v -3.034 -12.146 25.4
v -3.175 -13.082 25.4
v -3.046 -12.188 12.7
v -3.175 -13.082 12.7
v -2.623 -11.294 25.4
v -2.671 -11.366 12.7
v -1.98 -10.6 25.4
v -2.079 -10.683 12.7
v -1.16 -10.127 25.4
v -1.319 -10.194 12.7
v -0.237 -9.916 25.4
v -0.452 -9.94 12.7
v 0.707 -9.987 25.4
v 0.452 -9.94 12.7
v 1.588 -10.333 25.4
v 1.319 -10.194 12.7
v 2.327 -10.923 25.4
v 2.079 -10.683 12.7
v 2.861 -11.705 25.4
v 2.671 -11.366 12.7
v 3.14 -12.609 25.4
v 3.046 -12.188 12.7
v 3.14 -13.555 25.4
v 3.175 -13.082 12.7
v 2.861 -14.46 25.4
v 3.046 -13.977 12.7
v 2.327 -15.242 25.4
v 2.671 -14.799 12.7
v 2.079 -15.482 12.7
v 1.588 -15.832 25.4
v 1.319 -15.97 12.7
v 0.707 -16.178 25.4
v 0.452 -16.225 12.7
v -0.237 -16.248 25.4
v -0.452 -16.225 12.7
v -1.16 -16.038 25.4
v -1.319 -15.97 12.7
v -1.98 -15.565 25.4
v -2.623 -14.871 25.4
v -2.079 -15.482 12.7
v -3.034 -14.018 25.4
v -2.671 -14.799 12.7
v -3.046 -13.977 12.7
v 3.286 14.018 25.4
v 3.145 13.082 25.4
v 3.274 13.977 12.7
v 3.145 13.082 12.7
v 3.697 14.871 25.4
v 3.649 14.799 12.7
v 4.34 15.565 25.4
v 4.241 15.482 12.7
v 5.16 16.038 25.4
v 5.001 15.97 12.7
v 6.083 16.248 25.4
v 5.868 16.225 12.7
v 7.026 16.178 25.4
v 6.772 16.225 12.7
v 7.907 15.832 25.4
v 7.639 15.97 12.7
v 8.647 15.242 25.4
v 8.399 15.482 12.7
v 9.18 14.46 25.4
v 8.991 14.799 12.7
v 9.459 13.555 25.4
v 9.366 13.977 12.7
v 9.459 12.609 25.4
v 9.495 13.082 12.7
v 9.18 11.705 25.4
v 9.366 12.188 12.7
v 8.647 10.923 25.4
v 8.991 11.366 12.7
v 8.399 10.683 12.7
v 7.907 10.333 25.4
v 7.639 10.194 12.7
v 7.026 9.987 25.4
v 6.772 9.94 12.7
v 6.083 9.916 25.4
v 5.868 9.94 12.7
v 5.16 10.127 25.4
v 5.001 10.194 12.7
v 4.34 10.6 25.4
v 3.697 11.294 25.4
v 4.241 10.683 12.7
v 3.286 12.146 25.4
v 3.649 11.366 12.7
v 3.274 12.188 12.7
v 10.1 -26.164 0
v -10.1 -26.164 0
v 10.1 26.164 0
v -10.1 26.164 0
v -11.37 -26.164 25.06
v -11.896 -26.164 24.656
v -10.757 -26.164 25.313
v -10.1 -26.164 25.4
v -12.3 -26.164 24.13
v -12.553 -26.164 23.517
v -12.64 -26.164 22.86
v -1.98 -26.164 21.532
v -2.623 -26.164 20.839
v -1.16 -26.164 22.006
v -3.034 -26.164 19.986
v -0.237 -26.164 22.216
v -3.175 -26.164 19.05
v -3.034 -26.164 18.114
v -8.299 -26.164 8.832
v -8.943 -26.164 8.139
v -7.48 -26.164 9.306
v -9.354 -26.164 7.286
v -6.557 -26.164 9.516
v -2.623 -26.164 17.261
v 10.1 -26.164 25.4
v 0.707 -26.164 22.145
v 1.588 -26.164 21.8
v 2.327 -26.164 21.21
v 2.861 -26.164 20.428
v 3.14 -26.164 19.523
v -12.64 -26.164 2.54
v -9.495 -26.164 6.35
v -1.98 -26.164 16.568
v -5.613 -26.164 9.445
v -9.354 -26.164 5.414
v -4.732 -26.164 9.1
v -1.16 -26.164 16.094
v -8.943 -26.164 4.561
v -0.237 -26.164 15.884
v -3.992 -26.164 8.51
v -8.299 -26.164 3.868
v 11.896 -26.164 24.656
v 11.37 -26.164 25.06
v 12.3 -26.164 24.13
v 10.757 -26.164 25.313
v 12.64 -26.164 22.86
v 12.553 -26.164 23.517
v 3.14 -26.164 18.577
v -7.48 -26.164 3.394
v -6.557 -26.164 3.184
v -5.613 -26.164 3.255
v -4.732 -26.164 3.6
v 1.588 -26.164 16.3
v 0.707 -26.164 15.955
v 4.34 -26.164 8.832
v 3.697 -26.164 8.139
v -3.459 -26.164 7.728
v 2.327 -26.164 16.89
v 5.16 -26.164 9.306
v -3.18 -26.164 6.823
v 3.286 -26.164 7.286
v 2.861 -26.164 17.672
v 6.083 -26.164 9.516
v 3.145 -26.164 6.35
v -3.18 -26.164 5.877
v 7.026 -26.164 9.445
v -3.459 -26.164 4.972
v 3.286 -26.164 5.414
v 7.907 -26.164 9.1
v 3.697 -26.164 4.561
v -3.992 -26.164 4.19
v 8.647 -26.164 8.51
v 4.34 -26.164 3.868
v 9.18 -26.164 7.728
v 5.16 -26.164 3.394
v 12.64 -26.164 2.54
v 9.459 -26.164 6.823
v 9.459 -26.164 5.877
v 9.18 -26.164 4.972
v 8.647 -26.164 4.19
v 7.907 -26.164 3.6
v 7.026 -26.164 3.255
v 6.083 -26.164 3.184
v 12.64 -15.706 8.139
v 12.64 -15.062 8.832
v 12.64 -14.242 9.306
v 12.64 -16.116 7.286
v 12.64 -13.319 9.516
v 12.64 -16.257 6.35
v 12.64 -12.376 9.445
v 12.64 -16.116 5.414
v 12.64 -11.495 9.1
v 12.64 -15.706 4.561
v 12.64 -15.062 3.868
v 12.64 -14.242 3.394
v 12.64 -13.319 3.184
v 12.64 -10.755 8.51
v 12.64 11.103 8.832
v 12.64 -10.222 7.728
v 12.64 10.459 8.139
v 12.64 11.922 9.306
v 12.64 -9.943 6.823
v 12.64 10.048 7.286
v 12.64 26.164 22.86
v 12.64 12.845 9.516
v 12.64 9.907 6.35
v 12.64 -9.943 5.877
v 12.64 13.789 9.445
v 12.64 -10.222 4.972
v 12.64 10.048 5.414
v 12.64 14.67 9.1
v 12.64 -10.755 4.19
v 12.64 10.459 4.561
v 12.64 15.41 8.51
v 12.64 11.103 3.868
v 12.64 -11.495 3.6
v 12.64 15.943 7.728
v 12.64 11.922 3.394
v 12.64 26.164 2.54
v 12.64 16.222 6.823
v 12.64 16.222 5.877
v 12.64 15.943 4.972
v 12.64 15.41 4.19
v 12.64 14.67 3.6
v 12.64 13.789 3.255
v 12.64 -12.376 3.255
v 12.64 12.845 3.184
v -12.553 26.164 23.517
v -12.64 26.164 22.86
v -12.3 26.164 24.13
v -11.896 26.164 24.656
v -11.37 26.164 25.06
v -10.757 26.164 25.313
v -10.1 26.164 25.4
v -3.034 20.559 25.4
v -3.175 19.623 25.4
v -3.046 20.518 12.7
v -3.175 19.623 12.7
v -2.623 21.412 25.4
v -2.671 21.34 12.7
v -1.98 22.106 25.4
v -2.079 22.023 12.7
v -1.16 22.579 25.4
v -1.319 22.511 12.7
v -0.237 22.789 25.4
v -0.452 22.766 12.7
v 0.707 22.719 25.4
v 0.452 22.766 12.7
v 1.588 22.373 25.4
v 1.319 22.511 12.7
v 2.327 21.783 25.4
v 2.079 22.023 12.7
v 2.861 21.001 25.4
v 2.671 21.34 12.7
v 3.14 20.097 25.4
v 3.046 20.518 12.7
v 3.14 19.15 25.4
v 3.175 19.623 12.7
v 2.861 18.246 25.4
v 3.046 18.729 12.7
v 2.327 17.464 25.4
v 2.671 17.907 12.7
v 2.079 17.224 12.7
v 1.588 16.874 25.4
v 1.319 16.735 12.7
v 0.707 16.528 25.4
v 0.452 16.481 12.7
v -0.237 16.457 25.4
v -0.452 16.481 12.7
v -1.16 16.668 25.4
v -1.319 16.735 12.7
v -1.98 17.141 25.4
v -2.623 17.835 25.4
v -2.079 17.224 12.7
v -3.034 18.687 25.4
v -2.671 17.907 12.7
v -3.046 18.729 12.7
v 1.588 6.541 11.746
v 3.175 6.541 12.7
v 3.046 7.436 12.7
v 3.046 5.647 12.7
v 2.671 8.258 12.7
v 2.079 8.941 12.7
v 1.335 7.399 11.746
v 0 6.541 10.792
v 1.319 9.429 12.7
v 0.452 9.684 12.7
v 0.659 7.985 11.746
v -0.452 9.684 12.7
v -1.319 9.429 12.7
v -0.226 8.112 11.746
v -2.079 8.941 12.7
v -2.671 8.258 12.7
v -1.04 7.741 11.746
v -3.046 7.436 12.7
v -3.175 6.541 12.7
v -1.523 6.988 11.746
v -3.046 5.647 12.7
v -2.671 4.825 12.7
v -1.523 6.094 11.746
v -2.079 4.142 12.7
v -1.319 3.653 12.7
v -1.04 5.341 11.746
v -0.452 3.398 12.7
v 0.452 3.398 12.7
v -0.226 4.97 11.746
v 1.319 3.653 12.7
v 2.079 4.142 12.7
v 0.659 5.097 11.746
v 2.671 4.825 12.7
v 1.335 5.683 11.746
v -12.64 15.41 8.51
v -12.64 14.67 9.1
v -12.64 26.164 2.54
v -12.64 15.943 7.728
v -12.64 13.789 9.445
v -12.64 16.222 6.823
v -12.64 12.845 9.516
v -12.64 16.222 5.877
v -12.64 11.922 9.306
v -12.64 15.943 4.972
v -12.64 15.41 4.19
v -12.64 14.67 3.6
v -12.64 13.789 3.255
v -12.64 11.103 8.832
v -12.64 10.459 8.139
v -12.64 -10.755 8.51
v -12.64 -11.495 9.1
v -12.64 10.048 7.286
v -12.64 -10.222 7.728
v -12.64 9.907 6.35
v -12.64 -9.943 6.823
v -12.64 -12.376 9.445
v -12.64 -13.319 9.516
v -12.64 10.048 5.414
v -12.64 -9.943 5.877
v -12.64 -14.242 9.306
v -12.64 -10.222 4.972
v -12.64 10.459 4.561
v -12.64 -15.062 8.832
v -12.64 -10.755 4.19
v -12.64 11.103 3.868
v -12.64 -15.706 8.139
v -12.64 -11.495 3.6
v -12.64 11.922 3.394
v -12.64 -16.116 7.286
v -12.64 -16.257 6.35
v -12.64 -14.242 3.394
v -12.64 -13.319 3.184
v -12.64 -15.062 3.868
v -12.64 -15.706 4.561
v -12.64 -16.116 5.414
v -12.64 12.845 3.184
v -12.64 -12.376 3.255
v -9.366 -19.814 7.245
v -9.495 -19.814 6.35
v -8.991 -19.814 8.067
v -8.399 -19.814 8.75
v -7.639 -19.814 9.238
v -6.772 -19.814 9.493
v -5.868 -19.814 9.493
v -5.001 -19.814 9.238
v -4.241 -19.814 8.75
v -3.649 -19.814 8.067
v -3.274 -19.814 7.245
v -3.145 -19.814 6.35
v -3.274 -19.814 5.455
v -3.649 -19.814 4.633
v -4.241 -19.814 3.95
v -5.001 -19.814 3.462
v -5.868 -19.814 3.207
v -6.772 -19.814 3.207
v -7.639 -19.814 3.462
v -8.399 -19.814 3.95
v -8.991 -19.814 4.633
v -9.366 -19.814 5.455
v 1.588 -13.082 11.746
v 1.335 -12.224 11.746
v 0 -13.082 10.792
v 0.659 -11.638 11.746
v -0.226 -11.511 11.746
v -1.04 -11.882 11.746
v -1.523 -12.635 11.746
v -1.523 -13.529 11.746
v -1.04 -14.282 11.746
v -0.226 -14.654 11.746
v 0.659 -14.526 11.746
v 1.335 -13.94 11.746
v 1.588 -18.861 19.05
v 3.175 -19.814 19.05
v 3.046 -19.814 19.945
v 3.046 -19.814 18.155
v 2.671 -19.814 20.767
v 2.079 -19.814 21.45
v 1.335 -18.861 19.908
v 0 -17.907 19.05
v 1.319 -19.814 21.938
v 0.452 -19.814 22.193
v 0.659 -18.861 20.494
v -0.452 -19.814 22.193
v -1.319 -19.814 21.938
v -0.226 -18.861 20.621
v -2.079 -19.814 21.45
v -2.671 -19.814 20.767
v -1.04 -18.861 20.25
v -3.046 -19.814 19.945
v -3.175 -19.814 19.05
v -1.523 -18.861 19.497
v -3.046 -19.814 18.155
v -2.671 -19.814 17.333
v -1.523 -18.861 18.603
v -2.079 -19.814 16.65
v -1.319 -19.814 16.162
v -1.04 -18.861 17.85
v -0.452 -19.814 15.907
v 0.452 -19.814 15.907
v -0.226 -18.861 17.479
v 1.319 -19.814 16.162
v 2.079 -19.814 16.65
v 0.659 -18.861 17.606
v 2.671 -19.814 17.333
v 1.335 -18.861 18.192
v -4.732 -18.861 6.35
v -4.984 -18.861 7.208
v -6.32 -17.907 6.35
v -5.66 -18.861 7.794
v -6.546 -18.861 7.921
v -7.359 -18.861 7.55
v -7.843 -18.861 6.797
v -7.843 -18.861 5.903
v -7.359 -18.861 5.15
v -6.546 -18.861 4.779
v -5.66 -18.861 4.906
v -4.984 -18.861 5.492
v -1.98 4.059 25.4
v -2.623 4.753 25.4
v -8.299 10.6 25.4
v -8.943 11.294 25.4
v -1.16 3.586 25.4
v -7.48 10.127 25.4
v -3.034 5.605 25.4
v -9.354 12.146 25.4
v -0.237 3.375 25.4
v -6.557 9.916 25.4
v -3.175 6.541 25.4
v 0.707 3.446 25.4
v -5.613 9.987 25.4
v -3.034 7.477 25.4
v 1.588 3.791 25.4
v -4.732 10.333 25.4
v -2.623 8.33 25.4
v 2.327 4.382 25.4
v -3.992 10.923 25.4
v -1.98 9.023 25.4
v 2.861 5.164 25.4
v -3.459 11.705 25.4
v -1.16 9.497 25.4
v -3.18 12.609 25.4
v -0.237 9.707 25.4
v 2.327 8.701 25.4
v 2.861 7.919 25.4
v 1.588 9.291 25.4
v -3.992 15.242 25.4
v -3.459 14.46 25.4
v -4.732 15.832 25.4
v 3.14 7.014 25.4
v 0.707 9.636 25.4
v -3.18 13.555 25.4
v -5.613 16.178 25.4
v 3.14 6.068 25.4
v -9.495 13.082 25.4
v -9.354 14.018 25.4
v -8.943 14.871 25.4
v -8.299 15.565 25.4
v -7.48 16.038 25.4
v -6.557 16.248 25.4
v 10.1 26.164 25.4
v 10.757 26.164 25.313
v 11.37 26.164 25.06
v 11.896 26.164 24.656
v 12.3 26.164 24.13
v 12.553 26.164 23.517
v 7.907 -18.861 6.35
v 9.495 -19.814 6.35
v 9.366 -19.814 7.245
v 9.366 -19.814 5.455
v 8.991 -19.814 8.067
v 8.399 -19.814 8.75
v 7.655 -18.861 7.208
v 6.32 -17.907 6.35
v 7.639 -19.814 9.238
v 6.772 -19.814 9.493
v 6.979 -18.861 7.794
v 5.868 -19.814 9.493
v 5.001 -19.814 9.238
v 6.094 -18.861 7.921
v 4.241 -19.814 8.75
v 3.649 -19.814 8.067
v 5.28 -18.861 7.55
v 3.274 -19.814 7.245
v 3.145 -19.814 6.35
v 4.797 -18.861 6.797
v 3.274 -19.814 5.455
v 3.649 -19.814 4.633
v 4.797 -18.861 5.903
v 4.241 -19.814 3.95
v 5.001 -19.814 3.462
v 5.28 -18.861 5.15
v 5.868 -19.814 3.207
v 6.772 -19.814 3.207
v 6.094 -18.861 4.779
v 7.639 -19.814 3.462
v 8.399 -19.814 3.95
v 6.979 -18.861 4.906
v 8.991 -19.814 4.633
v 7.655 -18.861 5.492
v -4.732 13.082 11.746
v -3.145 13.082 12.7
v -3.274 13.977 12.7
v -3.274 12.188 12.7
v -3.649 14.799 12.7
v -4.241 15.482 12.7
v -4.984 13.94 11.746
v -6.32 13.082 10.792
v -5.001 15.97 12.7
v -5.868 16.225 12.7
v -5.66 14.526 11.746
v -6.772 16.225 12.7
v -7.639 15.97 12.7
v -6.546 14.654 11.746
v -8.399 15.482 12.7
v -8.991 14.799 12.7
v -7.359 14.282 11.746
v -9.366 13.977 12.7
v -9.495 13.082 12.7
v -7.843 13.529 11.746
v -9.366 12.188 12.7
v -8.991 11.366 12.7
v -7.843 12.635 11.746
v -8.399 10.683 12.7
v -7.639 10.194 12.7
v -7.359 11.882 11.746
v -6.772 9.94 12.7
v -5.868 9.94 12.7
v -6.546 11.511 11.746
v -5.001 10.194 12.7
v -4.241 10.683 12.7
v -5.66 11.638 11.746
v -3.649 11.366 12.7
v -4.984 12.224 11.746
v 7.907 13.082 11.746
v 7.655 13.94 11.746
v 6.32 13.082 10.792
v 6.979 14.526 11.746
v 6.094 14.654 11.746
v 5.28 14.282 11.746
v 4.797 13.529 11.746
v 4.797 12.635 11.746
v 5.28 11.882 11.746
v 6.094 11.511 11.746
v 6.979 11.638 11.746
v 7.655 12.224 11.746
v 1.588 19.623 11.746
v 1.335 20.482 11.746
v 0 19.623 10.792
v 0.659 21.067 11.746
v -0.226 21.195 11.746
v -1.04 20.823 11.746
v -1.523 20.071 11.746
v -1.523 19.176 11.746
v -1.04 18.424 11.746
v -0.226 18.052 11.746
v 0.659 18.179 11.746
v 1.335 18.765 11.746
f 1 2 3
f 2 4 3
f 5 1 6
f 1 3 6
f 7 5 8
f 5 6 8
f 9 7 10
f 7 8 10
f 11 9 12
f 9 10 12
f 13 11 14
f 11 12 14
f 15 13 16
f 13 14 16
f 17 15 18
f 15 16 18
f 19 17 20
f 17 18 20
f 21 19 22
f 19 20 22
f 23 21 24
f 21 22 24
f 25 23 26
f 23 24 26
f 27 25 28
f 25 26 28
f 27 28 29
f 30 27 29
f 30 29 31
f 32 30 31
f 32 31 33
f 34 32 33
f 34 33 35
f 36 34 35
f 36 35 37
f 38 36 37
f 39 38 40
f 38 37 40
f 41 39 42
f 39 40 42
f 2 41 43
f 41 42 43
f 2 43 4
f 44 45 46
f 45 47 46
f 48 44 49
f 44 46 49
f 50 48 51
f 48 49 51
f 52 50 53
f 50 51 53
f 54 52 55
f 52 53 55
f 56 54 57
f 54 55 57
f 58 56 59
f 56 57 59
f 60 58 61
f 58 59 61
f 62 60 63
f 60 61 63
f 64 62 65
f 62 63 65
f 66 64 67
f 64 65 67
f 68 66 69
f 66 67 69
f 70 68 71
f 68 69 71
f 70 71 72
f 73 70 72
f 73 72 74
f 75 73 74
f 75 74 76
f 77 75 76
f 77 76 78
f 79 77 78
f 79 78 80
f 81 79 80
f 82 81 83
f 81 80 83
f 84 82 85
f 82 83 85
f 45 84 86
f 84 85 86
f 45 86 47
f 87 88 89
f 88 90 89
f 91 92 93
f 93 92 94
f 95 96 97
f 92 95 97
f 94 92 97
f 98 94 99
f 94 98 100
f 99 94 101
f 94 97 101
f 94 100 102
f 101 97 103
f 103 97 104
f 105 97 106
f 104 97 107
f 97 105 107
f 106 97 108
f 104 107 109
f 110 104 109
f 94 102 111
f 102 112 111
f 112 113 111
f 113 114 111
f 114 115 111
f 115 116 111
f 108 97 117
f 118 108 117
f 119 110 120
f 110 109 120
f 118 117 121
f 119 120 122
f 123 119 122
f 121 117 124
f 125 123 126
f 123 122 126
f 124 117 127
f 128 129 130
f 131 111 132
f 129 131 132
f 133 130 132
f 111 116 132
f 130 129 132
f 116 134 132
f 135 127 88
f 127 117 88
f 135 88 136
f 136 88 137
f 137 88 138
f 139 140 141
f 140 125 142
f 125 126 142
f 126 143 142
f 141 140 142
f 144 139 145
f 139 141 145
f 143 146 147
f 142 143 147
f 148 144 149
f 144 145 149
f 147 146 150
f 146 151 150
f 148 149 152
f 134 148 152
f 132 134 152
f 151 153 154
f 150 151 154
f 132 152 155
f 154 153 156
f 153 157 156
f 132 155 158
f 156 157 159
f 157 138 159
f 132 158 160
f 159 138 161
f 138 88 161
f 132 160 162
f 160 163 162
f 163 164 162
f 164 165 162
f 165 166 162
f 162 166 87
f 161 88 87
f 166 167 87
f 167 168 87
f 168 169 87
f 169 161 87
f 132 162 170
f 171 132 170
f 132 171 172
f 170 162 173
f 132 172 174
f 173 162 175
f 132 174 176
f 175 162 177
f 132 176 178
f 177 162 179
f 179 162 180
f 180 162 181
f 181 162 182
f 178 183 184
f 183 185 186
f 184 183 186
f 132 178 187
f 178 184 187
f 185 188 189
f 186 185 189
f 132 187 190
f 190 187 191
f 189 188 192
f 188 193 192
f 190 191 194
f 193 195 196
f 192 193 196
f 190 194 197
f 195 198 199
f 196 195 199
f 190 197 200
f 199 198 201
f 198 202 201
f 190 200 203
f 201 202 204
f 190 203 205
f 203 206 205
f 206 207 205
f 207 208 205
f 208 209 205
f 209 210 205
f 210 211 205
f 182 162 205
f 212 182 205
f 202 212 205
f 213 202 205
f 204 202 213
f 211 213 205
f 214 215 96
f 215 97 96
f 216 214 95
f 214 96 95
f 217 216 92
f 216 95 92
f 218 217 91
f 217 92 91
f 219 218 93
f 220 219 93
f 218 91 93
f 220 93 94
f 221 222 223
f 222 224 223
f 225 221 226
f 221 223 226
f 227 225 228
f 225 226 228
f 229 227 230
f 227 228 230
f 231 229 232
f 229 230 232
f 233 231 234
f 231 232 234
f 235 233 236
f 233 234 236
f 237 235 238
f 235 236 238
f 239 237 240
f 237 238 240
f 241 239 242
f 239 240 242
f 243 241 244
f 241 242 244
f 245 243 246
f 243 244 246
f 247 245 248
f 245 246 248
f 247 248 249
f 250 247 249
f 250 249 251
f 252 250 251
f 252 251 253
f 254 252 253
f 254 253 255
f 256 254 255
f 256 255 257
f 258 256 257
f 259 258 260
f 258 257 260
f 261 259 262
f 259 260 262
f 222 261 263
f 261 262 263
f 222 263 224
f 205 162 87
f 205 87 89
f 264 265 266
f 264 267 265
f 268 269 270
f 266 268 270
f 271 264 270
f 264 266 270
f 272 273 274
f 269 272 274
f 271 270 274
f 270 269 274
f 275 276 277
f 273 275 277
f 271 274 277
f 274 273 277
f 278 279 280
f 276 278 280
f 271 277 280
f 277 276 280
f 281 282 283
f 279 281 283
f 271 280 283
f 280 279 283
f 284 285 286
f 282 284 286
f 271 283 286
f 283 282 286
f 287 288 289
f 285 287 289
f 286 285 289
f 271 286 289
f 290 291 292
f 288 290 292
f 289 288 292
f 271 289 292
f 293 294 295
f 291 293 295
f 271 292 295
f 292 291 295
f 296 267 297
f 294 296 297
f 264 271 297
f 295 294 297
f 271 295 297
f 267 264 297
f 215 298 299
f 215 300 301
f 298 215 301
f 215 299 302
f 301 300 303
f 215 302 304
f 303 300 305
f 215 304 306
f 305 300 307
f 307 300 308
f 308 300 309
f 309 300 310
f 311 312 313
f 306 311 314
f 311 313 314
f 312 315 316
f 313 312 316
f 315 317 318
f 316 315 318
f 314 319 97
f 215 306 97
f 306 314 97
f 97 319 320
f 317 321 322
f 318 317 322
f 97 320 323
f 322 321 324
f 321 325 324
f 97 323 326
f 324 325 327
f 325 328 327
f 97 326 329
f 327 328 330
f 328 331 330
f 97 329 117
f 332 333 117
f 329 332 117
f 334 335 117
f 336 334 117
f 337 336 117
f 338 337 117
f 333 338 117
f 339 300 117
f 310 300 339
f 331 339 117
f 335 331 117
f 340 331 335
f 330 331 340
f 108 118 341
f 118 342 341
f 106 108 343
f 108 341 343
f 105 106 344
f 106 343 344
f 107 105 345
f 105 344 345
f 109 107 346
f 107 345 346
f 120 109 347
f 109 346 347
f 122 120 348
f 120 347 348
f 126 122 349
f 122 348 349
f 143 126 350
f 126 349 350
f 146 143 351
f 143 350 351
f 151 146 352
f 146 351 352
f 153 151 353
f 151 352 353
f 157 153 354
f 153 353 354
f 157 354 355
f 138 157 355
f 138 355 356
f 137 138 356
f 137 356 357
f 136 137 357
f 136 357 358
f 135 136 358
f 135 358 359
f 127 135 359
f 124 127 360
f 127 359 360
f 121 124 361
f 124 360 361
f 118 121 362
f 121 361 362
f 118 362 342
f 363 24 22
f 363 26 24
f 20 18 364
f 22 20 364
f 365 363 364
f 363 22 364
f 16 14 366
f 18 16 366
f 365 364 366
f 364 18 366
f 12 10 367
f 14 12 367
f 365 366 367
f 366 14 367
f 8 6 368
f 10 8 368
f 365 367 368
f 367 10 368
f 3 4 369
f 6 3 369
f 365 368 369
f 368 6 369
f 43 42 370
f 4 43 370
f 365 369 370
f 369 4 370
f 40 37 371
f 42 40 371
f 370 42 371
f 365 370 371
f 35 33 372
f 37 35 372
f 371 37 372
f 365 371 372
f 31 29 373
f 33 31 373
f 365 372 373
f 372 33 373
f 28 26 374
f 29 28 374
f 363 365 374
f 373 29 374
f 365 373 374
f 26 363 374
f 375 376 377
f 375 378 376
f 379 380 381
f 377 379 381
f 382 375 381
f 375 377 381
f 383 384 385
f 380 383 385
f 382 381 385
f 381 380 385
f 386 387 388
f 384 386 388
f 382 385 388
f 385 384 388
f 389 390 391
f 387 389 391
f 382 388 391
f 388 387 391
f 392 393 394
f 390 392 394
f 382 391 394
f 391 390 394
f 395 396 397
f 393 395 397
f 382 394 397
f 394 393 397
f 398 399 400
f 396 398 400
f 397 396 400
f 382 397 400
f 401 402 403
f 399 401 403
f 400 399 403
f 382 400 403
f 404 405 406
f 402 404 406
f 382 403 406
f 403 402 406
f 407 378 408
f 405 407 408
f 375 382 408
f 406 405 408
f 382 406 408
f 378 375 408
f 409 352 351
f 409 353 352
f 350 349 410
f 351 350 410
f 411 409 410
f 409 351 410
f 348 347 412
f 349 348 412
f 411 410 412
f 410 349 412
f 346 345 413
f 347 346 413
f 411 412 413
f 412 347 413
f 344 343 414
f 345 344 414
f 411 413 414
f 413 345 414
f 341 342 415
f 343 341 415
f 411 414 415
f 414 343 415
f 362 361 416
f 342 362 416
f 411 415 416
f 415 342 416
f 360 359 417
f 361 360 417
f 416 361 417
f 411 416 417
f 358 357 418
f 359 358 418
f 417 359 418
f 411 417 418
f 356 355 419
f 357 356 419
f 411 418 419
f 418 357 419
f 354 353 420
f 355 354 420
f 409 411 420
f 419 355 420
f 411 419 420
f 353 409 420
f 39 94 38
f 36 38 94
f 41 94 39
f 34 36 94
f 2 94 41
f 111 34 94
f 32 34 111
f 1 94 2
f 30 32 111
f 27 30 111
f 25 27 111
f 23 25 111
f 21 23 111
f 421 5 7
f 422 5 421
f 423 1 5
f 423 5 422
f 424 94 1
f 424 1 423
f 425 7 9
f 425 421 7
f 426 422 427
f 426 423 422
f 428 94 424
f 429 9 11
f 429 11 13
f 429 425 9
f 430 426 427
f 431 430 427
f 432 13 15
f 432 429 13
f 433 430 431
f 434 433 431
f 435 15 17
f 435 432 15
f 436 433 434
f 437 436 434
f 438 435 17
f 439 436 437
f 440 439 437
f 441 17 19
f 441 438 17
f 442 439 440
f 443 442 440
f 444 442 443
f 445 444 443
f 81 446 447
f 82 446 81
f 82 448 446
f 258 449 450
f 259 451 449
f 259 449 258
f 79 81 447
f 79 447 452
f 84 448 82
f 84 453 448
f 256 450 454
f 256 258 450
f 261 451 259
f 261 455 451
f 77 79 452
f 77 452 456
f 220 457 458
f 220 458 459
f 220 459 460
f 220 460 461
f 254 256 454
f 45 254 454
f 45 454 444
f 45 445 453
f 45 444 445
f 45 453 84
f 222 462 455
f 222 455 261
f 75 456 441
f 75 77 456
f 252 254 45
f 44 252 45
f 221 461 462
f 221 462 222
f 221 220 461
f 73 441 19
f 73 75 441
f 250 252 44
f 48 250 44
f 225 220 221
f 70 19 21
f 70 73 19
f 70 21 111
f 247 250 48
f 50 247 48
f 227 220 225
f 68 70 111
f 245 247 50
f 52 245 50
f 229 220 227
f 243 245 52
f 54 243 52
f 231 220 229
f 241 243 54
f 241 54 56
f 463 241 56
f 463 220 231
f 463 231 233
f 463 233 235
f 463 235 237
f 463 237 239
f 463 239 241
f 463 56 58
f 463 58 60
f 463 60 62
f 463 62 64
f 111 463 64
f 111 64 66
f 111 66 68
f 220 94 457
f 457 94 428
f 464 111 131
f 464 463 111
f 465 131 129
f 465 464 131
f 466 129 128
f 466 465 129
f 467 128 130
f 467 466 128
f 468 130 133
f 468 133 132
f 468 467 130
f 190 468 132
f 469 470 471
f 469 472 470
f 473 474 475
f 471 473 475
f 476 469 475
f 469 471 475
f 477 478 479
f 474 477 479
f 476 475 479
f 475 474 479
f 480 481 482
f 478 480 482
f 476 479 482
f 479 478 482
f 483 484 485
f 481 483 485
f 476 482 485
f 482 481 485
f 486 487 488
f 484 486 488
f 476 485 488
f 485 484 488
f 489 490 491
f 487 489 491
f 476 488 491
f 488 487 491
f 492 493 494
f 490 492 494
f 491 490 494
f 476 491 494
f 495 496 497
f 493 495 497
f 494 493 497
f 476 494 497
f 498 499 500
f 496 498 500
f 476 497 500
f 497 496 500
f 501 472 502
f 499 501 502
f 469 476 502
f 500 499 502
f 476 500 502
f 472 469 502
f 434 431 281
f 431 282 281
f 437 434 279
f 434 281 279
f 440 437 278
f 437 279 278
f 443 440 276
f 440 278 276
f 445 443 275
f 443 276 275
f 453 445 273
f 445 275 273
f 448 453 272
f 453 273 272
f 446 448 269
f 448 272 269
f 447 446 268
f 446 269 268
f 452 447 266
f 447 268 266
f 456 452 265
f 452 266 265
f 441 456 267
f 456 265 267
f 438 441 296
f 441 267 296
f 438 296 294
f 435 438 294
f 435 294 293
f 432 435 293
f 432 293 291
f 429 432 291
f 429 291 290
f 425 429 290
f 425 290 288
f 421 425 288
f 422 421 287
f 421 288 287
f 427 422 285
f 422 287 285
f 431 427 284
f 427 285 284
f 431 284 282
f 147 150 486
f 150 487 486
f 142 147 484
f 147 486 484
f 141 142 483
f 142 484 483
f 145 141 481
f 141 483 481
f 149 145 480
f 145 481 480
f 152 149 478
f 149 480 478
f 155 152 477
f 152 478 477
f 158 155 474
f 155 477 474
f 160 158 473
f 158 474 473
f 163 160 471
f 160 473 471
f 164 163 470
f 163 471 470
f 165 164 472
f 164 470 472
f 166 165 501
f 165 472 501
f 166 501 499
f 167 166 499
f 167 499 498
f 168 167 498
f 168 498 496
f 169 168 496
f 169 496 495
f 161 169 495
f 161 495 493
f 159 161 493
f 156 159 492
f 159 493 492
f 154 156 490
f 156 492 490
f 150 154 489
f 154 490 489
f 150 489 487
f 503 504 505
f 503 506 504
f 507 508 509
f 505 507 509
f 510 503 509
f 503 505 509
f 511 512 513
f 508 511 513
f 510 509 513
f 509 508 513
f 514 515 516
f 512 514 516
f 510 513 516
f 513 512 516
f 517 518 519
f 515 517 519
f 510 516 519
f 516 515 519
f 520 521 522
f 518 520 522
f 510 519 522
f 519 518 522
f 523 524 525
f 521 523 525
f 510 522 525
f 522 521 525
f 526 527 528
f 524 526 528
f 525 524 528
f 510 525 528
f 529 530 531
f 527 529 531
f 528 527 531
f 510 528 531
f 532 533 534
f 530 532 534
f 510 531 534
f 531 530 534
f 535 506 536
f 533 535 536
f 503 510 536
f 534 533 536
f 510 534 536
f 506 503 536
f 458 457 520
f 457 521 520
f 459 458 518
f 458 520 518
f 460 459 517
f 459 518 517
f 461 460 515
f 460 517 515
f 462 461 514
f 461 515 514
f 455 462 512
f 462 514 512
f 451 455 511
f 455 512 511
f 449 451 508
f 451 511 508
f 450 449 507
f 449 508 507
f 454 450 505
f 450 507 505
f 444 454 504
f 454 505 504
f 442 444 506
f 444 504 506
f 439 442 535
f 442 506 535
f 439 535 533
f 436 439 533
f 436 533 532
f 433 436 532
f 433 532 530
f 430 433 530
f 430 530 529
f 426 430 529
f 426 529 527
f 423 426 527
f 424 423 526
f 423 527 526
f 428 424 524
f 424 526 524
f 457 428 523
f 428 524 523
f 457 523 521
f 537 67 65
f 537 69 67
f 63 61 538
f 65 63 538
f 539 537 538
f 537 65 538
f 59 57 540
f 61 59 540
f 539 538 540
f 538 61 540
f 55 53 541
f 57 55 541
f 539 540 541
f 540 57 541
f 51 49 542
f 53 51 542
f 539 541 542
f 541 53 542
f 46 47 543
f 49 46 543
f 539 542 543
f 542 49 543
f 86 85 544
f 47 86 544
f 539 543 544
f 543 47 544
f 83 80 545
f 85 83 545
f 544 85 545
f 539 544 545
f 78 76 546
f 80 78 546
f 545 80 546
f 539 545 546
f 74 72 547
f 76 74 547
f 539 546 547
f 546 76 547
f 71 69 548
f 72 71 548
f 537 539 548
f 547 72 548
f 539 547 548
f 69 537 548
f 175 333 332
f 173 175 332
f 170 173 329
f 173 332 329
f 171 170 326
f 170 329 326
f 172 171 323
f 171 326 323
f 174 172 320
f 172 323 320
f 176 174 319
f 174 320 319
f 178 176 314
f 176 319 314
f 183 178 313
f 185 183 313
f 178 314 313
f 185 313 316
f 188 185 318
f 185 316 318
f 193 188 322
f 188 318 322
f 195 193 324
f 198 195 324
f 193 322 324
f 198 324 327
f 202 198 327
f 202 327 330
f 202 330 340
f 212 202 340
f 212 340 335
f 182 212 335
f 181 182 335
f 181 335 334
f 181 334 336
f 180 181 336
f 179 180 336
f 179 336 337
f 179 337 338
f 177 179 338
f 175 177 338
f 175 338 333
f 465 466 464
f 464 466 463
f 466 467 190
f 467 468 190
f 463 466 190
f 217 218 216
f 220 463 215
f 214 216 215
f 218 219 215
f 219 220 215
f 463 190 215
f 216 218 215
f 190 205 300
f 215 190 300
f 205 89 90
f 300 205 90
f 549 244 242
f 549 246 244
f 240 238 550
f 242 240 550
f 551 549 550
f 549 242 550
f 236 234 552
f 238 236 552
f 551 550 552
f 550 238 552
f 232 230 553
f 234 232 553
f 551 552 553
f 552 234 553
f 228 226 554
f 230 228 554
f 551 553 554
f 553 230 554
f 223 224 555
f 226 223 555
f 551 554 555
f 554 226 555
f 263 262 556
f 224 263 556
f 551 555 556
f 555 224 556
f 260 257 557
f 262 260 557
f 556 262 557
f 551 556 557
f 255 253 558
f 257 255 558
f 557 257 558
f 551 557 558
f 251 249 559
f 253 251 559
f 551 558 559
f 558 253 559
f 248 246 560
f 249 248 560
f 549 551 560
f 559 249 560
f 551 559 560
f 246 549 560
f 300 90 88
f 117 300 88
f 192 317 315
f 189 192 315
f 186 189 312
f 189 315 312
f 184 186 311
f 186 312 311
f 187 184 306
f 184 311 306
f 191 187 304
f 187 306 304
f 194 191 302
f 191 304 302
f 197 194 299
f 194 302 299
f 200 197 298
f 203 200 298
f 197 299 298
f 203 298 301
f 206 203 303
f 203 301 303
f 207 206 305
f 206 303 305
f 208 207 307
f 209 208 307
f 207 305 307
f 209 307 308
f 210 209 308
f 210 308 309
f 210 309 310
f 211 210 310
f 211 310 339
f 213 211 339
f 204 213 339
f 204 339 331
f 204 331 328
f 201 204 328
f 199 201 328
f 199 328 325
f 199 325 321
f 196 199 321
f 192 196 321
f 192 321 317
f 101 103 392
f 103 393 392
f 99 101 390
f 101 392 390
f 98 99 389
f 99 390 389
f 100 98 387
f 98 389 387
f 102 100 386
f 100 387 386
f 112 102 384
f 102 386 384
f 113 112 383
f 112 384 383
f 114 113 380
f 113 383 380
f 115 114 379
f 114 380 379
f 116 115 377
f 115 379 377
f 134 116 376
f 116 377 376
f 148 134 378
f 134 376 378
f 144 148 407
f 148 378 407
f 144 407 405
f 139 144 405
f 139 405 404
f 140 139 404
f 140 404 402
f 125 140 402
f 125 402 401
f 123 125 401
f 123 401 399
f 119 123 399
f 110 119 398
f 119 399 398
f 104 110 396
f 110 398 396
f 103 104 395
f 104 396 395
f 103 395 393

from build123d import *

# Parameters (mm, degrees)
F1_DEPTH = 25.4
F3_D     = 6.35
F5_D     = 6.35
F5_DEPTH = 6.35
F5_TIP   = 1.9077324654
F7_D     = 6.35
F7_DEPTH = 12.7
F7_TIP   = 1.9077324654
F8_R     = 2.54
F9_SIZE  = 2.54


with BuildPart() as f1:
    # F0 (on Top) → F1 (new body)
    with BuildSketch(Plane.XY):
        Polygon((-12.6398103312, -26.1644069105), (0, -26.1644069105), (12.6398103312, -26.1644069105), (12.6398103312, 0), (12.6398103312, 26.1644069105), (0, 26.1644069105), (-12.6398103312, 26.1644069105), (-12.6398103312, 0), align=None)
    extrude(amount=F1_DEPTH)

    # F3 (through all)
    with Locations(Plane.YZ.offset(12.6398103312)):
        with Locations((-13.0822034553, 6.35), (13.0822034553, 6.35)):
            Hole(F3_D / 2)

    # F5
    with Locations(Plane.XZ.offset(26.1644069105)):
        with Locations((-6.3199051656, 6.35), (6.3199051656, 6.35), (0, 19.05)):
            Hole(F5_D / 2, depth=F5_DEPTH)
            with Locations((0, 0, -(F5_DEPTH + F5_TIP / 2))):  # 118° drill point
                Cone(0, F5_D / 2, F5_TIP, mode=Mode.SUBTRACT)

    # F7
    with Locations(Plane.XY.offset(25.4)):
        with Locations((0, 19.6233051829), (0, 6.5411017276), (-6.3199051656, 13.0822034553), (6.3199051656, 13.0822034553), (0, -13.0822034553)):
            Hole(F7_D / 2, depth=F7_DEPTH)
            with Locations((0, 0, -(F7_DEPTH + F7_TIP / 2))):  # 118° drill point
                Cone(0, F7_D / 2, F7_TIP, mode=Mode.SUBTRACT)

    # F8
    f8_edges = [f1.edges().sort_by_distance(p)[0] for p in [
        (12.63981, 0, 25.4),
        (-12.63981, 0, 25.4),
    ]]
    fillet(f8_edges, radius=F8_R)

    # F9
    f9_edges = [f1.edges().sort_by_distance(p)[0] for p in [
        (-12.63981, 0, 0),
        (12.63981, 0, 0),
    ]]
    chamfer(f9_edges, length=F9_SIZE)


solid = f1.part
